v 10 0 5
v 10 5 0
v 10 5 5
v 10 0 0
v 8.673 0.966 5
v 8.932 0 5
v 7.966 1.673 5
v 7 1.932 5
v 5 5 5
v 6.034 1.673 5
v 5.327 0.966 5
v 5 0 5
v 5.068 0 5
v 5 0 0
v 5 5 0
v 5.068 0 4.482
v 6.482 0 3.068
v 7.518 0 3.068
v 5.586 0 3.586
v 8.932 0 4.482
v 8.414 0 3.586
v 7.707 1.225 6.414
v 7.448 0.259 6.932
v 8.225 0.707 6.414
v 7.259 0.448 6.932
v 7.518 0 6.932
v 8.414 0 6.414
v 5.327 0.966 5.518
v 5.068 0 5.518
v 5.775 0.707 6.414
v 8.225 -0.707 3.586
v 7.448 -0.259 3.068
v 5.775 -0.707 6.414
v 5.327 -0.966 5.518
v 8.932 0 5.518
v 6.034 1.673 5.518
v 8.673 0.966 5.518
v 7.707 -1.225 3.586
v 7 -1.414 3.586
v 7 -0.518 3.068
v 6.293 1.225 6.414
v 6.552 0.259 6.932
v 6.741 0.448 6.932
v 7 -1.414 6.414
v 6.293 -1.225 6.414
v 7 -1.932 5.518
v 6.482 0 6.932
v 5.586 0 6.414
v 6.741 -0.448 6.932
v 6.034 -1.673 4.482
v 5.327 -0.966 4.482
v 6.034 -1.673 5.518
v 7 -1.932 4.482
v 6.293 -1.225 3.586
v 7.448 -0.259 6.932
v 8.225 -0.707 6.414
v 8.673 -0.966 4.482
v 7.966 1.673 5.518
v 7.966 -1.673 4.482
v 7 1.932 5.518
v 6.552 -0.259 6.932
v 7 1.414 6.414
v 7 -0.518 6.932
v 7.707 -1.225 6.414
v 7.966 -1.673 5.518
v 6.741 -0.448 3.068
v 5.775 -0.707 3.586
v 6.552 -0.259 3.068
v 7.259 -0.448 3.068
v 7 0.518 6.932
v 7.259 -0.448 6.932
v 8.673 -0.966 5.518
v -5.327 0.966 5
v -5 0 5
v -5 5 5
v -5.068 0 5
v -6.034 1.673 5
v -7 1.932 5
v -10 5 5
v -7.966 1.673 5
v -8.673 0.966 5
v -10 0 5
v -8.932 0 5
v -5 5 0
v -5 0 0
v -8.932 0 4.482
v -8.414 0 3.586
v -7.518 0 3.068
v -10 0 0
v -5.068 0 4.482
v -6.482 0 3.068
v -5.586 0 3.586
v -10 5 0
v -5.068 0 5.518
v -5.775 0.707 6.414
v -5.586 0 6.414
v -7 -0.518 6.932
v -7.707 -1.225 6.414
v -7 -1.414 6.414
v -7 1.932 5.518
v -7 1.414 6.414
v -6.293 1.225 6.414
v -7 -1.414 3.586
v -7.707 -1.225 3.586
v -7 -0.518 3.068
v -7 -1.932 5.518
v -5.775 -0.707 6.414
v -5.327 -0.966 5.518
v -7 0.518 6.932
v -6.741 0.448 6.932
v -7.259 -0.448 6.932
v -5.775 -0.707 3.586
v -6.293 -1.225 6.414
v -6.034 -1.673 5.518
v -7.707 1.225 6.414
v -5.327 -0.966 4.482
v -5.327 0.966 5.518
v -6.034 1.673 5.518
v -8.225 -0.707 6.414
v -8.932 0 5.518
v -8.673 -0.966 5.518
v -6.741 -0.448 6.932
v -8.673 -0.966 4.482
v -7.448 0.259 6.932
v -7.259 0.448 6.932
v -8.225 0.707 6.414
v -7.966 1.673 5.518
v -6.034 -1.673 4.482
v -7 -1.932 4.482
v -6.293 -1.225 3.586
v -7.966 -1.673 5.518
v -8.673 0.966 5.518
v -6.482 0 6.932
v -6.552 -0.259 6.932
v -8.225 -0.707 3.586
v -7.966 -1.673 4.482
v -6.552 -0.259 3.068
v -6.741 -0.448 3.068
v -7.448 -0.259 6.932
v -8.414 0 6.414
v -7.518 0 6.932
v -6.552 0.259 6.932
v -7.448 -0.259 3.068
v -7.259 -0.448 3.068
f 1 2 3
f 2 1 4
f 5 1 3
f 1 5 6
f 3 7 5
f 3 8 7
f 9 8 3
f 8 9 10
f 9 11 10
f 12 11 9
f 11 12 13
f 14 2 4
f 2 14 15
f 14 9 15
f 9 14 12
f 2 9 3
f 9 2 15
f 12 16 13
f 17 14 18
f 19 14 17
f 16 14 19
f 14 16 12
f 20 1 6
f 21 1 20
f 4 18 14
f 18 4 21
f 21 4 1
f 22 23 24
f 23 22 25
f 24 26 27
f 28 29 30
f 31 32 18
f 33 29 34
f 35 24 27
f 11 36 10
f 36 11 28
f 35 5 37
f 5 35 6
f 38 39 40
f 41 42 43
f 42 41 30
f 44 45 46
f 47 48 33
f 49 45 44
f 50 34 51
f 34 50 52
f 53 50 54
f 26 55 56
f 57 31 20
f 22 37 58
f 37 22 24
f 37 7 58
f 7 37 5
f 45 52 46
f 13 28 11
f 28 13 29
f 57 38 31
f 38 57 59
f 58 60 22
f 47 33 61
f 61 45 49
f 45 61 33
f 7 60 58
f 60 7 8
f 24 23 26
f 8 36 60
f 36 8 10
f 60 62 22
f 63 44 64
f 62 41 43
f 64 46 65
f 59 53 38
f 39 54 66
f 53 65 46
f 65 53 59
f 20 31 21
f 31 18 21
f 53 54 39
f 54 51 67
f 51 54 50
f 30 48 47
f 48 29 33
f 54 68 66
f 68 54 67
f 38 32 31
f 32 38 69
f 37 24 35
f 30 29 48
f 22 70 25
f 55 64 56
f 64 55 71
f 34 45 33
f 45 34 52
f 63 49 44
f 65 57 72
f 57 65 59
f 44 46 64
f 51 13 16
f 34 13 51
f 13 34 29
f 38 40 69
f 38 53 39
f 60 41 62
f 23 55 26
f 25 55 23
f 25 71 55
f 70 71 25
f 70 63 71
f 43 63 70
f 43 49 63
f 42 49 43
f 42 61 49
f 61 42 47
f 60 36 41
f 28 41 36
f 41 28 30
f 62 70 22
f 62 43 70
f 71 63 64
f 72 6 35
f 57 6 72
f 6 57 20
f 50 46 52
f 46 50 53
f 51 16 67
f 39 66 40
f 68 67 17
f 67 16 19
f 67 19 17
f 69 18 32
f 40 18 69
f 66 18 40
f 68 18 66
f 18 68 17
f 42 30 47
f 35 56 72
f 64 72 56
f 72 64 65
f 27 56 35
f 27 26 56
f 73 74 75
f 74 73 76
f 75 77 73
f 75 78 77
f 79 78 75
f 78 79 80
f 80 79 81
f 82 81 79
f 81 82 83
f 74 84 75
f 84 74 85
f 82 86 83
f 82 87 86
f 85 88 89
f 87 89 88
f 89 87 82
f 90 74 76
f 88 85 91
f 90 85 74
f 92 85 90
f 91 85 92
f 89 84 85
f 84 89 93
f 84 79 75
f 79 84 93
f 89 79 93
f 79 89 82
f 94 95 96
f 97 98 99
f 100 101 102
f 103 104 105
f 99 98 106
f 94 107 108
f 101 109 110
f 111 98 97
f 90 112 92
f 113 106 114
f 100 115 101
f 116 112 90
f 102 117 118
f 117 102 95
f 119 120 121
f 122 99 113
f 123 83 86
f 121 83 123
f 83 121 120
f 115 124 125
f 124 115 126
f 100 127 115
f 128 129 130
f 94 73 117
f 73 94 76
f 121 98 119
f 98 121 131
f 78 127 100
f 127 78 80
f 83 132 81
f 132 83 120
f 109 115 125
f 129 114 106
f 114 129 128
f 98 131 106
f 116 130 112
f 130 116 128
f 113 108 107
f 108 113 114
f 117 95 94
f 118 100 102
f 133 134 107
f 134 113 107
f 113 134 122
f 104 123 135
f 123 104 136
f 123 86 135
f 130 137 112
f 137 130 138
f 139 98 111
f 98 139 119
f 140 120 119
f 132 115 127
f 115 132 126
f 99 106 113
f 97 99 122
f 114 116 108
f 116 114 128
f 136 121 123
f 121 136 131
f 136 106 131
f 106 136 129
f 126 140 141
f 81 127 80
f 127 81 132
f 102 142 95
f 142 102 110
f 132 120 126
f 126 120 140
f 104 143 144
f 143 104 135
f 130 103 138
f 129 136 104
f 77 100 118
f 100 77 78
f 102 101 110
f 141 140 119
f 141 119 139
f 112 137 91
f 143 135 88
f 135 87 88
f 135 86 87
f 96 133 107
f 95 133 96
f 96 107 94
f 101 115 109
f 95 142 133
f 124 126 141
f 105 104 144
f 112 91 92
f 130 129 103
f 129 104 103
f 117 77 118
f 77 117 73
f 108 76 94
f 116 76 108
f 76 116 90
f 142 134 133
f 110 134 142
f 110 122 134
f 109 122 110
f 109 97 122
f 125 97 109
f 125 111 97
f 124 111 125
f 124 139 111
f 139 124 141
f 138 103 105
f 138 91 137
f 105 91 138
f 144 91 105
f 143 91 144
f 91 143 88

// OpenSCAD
// Generated by scadwright. Do not hand-edit —
// edit the Python source and regenerate.

$fn = 12;

union() {
    translate([5, 0, 0]) {
        cube([5, 5, 5], center=false);
    }

    translate([7, 0, 5]) {
        sphere(r=2);
    }

    mirror([1, 0, 0]) {
        translate([5, 0, 0]) {
            cube([5, 5, 5], center=false);
        }
    }

    mirror([1, 0, 0]) {
        translate([7, 0, 5]) {
            sphere(r=2);
        }
    }
}
